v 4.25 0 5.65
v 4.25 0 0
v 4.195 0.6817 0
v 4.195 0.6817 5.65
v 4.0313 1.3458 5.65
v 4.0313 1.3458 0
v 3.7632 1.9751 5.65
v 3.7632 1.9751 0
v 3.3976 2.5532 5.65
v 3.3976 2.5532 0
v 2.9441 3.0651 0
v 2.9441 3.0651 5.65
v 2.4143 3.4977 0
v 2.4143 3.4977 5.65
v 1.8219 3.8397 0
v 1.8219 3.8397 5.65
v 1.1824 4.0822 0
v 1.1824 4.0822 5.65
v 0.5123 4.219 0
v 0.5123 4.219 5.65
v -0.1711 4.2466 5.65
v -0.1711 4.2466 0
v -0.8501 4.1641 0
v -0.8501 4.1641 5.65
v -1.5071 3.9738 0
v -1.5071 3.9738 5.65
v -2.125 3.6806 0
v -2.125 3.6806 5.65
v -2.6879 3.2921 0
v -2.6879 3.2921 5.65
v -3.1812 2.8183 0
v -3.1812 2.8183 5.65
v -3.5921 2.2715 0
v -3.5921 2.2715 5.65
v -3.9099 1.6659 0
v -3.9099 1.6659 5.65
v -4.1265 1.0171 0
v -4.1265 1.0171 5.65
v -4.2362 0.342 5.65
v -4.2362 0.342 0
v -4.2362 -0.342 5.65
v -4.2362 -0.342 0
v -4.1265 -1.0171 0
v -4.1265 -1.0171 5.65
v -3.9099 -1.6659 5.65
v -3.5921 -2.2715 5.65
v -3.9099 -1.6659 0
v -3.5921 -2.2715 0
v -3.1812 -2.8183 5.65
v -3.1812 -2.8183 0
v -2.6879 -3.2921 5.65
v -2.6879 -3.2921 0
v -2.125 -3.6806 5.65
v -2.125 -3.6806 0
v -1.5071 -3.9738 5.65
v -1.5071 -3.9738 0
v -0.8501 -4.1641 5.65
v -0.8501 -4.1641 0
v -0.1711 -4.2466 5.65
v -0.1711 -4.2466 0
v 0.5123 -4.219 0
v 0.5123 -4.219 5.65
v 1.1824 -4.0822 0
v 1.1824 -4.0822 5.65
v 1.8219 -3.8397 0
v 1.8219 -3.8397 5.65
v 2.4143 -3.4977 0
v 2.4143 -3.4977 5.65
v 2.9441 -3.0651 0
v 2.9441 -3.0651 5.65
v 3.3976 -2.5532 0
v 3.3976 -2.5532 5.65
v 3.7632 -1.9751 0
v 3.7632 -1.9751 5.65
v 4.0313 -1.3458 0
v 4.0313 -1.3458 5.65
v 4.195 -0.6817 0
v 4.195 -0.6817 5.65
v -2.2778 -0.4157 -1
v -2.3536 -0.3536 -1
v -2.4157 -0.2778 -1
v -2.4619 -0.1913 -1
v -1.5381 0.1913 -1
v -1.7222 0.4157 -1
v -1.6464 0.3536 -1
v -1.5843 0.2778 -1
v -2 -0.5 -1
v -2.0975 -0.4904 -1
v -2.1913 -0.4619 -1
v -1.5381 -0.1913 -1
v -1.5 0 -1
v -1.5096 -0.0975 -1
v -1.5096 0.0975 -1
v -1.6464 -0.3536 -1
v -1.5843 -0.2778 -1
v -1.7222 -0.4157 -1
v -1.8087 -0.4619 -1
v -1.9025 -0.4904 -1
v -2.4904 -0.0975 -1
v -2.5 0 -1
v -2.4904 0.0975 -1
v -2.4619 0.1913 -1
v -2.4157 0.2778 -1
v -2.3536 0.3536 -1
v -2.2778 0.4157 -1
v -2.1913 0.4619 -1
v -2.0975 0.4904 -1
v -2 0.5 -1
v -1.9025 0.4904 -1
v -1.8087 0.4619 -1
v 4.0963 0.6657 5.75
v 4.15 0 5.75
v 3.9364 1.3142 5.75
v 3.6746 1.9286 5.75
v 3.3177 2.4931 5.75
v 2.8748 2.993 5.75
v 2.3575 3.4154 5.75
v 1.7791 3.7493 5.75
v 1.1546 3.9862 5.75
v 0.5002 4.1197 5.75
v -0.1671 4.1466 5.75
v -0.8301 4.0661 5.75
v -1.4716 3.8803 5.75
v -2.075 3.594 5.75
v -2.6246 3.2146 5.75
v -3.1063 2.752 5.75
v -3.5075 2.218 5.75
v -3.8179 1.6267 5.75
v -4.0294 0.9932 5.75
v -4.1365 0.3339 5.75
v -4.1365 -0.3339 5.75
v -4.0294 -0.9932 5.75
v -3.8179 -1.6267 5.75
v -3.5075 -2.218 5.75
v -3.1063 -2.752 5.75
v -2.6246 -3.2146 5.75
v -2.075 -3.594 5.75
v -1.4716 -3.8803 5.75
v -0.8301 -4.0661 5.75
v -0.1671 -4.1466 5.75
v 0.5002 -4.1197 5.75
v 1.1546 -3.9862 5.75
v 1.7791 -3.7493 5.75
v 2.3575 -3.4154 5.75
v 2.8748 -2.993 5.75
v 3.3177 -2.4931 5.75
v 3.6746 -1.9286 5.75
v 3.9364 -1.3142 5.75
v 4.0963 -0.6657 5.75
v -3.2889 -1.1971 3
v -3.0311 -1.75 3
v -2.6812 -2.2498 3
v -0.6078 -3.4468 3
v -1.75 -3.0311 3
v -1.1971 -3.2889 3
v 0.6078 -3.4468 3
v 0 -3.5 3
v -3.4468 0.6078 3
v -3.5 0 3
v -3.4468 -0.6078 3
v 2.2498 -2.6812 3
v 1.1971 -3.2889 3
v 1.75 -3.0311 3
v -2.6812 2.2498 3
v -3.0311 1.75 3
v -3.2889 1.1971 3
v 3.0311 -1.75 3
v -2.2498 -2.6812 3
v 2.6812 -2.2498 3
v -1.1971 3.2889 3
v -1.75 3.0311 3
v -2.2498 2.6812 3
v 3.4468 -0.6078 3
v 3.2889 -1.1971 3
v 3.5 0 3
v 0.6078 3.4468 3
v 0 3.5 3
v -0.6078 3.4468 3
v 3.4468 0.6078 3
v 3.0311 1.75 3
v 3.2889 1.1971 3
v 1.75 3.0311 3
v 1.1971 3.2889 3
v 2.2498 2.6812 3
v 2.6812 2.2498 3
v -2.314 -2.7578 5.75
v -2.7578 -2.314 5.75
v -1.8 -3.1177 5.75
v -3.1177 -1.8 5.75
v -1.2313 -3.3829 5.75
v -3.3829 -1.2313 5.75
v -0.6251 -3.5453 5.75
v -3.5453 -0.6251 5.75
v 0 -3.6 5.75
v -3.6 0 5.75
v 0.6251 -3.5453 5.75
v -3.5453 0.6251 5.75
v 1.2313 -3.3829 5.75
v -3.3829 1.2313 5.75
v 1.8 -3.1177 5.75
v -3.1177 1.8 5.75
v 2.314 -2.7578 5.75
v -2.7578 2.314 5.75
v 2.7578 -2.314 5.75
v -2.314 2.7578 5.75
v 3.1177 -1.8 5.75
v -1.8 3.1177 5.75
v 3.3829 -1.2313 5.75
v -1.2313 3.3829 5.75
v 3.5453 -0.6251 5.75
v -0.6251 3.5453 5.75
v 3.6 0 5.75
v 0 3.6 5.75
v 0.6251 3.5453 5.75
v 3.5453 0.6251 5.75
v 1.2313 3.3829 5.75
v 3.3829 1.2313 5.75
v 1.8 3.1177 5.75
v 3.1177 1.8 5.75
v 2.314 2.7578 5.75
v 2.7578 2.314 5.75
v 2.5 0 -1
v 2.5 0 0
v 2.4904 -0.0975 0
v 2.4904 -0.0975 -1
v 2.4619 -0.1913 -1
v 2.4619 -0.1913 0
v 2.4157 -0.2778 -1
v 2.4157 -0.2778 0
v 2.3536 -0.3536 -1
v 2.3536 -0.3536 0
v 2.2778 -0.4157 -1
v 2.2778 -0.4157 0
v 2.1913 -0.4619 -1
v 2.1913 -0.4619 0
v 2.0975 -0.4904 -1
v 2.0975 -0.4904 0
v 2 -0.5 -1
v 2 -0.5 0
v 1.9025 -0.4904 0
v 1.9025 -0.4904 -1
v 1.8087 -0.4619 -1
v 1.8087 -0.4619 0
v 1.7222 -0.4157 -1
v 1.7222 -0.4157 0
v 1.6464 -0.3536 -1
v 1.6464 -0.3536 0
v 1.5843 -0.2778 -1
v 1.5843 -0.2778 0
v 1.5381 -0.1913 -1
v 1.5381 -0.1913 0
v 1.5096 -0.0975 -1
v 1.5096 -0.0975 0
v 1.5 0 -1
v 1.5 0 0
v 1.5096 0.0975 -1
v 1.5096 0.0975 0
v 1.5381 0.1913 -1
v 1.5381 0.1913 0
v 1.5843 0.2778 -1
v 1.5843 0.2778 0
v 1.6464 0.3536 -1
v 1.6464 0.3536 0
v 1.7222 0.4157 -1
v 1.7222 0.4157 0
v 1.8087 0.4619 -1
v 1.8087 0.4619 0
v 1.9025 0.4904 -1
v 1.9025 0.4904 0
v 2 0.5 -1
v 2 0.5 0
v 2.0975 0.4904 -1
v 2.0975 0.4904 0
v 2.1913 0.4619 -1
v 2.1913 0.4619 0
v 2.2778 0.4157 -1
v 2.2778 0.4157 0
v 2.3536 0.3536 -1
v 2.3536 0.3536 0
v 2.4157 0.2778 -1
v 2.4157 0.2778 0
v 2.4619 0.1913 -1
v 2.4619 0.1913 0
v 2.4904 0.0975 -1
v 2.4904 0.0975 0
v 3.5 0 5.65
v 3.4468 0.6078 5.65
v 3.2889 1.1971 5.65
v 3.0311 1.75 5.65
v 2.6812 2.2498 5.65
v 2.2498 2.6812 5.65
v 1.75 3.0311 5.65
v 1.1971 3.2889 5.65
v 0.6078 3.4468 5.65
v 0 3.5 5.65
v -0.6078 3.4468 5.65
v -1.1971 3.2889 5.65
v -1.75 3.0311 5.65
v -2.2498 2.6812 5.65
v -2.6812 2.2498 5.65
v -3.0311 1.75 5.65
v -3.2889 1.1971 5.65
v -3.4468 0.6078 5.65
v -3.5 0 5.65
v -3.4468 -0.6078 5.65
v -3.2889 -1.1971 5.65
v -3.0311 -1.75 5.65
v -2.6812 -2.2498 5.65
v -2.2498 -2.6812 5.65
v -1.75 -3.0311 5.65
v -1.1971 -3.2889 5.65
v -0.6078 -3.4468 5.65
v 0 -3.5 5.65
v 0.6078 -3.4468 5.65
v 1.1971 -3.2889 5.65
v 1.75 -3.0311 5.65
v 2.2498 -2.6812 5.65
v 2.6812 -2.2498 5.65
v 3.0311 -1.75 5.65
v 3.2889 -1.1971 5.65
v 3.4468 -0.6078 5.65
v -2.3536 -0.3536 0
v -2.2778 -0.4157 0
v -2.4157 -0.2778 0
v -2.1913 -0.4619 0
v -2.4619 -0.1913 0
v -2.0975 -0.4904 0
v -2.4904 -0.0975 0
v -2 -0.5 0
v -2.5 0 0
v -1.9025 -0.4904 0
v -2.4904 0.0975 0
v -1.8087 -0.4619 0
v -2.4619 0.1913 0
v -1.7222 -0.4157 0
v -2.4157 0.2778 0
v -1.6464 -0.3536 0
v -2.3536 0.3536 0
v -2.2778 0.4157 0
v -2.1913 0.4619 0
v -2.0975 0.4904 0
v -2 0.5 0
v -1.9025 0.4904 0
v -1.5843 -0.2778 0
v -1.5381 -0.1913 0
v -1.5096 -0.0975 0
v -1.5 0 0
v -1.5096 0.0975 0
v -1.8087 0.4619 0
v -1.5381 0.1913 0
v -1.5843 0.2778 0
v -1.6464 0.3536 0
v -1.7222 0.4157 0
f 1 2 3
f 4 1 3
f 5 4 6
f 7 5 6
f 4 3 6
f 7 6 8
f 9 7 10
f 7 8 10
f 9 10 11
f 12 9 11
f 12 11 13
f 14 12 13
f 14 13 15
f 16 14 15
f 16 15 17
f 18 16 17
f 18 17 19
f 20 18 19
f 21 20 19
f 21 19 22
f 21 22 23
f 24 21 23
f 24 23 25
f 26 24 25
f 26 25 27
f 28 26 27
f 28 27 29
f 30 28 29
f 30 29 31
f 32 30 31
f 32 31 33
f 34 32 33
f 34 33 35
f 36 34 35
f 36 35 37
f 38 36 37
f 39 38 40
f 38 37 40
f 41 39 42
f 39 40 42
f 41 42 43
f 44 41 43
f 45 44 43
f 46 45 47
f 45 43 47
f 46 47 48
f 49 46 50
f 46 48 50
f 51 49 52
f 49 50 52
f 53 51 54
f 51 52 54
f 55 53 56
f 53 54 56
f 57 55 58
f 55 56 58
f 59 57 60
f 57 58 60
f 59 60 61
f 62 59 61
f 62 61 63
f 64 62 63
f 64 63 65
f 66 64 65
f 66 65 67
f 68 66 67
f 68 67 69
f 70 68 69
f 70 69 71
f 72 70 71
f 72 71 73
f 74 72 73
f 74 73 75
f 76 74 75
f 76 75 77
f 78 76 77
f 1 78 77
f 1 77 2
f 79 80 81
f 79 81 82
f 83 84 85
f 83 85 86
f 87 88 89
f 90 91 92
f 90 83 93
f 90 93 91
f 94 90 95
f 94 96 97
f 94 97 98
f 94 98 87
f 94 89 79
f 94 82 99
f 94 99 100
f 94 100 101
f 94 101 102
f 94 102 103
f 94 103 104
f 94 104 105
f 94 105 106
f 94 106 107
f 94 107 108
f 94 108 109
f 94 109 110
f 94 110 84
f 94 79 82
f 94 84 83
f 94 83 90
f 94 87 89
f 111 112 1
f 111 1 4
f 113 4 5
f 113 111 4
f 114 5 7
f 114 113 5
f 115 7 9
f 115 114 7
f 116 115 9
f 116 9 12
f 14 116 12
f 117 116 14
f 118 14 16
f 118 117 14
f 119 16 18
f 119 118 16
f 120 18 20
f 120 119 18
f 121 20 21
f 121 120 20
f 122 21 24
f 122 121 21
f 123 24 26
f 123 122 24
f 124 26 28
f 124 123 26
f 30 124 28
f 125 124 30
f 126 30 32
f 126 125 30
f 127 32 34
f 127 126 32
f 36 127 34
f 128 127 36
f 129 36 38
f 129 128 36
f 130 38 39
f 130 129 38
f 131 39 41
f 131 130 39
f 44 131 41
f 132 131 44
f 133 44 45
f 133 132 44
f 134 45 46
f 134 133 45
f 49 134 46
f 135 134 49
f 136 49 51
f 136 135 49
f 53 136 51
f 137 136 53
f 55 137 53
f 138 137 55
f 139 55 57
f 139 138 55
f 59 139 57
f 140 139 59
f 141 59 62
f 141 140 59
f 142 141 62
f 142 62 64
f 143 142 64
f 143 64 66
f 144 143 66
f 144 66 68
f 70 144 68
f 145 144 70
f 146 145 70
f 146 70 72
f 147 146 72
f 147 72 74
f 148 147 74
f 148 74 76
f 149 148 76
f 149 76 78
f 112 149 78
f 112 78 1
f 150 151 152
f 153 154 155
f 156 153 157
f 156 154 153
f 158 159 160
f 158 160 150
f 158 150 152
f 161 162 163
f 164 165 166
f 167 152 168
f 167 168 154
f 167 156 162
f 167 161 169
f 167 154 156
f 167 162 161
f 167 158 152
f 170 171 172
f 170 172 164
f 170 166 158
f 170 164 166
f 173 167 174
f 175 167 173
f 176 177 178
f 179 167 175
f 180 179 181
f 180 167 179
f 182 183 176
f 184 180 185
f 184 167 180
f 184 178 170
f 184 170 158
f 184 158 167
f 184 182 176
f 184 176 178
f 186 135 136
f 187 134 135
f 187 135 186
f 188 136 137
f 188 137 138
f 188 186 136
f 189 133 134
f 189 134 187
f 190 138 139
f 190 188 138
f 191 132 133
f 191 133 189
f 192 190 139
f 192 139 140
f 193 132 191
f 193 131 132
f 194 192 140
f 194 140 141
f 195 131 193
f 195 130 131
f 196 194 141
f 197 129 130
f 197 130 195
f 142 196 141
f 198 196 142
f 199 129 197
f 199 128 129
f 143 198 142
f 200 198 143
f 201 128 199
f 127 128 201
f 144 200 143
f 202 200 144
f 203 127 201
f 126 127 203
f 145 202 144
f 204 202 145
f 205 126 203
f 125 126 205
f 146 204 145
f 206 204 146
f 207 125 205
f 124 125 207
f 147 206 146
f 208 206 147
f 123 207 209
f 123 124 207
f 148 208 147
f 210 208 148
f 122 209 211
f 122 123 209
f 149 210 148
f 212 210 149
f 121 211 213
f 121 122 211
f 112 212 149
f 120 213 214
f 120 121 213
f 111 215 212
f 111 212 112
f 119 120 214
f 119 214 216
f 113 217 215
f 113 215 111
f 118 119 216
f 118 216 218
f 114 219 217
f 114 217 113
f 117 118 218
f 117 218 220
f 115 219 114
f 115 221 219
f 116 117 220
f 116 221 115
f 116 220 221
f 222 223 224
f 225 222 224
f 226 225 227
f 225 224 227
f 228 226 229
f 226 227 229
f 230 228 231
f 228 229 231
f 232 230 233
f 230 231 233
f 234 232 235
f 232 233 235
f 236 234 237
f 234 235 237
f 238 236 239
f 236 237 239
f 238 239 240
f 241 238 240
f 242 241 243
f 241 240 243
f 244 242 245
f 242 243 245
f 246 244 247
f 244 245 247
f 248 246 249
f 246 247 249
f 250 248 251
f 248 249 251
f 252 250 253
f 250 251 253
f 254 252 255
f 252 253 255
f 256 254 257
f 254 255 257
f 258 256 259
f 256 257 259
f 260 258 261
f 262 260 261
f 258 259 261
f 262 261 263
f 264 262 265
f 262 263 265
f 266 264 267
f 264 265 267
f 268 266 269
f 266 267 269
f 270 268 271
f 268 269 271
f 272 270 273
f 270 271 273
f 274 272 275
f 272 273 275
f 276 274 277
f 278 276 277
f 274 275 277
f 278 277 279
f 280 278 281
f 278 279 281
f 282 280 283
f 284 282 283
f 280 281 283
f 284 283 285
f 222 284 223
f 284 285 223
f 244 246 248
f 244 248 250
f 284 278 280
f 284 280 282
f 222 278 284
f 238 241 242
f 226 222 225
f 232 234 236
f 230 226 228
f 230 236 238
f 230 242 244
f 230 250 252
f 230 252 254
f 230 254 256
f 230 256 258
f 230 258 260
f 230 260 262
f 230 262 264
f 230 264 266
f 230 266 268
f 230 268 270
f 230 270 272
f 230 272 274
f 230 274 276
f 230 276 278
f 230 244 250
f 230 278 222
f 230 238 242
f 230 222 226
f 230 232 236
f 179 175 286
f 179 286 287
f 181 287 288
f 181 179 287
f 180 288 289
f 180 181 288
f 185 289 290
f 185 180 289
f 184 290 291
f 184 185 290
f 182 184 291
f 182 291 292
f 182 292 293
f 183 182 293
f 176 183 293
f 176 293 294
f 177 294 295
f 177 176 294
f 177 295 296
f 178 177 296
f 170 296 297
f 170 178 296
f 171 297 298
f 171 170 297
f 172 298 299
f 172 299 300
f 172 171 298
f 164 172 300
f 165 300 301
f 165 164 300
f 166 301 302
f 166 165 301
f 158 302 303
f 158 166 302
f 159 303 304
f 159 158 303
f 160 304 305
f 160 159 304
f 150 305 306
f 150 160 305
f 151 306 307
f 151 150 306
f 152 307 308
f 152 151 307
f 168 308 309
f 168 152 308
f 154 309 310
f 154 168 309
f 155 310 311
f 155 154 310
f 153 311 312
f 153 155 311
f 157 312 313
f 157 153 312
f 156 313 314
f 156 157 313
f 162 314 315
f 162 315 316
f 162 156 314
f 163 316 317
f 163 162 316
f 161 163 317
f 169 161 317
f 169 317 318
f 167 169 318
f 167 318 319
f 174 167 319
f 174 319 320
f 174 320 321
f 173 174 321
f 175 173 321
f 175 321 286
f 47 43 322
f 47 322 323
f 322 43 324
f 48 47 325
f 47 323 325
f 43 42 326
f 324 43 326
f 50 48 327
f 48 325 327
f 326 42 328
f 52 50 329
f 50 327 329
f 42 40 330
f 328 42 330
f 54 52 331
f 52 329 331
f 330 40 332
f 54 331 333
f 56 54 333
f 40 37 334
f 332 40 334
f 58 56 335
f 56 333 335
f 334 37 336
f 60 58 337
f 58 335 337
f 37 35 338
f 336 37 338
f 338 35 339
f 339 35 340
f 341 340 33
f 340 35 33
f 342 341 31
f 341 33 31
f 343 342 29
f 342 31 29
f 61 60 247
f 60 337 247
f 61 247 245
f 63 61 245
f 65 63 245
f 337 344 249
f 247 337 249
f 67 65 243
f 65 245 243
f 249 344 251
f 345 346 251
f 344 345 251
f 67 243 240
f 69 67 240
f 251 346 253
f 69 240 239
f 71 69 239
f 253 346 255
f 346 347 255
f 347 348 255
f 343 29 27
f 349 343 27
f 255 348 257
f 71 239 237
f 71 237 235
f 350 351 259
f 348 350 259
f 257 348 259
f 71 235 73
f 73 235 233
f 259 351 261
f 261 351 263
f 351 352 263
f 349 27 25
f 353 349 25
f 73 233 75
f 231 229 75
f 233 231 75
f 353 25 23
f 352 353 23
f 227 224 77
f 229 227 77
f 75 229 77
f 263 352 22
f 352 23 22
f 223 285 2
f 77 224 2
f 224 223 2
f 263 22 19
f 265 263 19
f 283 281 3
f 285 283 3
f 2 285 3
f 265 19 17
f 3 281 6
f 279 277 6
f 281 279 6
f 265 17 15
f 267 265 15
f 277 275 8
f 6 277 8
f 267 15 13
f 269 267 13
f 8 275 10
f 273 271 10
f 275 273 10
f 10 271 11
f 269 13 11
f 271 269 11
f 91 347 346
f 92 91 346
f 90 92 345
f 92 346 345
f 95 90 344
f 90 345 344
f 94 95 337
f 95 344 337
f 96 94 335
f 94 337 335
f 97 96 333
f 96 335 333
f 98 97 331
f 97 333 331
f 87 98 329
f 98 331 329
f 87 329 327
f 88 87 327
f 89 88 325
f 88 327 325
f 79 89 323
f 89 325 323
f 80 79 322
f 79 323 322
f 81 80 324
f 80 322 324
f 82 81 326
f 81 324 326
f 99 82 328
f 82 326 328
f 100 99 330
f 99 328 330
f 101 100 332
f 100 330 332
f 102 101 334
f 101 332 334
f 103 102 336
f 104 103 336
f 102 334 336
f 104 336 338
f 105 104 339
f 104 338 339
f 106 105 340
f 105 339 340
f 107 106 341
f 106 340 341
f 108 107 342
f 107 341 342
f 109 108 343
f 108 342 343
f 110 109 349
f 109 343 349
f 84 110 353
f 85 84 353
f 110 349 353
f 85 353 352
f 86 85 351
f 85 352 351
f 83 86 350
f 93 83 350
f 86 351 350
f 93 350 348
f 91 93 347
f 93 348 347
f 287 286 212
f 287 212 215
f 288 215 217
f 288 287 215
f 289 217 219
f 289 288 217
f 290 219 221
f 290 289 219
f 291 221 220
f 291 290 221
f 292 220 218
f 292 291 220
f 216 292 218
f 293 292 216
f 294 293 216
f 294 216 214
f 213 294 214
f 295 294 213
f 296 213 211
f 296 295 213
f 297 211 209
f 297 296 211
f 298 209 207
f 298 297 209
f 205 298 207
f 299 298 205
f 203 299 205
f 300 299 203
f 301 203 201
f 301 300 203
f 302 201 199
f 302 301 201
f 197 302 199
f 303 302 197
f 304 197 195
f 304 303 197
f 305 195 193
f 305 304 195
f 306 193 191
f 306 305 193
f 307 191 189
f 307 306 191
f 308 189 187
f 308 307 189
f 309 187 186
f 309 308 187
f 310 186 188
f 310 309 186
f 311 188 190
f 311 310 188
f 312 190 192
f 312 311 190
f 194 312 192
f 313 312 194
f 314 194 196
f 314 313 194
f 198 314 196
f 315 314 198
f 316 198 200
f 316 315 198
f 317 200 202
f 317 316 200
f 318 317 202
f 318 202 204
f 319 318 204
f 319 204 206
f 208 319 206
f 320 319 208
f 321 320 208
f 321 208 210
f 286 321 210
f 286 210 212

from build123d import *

# Parameters (mm, degrees)
F0_R     = 4.25
F1_DEPTH = 3
F2_R     = 4.25
F2_R_2   = 3.5
F3_DEPTH = 2.75
F4_R     = 0.5
F5_DEPTH = 1
F6_SIZE  = 0.1


with BuildPart() as f1:
    # F0 (on Top) → F1 (new body)
    with BuildSketch(Plane.XY):
        Circle(F0_R)
    extrude(amount=F1_DEPTH)

    # F2 (on face) → F3 (join)
    with BuildSketch(Plane.XY.offset(3)):
        Circle(F2_R)
        Circle(F2_R_2, mode=Mode.SUBTRACT)
    extrude(amount=F3_DEPTH)

    # F4 (on face) → F5 (join)
    with BuildSketch(Plane(origin=(0, 0, 0), x_dir=(1, 0, 0), z_dir=(0, 0, -1))):
        with Locations((-2, 0)):
            Circle(F4_R)
        with Locations((2, 0)):
            Circle(F4_R)
    extrude(amount=F5_DEPTH)

    # F6
    f6_edges = [f1.edges().sort_by_distance(p)[0] for p in [
        (-3.5, 0, 5.75),
        (-4.25, 0, 5.75),
    ]]
    chamfer(f6_edges, length=F6_SIZE)


solid = f1.part
